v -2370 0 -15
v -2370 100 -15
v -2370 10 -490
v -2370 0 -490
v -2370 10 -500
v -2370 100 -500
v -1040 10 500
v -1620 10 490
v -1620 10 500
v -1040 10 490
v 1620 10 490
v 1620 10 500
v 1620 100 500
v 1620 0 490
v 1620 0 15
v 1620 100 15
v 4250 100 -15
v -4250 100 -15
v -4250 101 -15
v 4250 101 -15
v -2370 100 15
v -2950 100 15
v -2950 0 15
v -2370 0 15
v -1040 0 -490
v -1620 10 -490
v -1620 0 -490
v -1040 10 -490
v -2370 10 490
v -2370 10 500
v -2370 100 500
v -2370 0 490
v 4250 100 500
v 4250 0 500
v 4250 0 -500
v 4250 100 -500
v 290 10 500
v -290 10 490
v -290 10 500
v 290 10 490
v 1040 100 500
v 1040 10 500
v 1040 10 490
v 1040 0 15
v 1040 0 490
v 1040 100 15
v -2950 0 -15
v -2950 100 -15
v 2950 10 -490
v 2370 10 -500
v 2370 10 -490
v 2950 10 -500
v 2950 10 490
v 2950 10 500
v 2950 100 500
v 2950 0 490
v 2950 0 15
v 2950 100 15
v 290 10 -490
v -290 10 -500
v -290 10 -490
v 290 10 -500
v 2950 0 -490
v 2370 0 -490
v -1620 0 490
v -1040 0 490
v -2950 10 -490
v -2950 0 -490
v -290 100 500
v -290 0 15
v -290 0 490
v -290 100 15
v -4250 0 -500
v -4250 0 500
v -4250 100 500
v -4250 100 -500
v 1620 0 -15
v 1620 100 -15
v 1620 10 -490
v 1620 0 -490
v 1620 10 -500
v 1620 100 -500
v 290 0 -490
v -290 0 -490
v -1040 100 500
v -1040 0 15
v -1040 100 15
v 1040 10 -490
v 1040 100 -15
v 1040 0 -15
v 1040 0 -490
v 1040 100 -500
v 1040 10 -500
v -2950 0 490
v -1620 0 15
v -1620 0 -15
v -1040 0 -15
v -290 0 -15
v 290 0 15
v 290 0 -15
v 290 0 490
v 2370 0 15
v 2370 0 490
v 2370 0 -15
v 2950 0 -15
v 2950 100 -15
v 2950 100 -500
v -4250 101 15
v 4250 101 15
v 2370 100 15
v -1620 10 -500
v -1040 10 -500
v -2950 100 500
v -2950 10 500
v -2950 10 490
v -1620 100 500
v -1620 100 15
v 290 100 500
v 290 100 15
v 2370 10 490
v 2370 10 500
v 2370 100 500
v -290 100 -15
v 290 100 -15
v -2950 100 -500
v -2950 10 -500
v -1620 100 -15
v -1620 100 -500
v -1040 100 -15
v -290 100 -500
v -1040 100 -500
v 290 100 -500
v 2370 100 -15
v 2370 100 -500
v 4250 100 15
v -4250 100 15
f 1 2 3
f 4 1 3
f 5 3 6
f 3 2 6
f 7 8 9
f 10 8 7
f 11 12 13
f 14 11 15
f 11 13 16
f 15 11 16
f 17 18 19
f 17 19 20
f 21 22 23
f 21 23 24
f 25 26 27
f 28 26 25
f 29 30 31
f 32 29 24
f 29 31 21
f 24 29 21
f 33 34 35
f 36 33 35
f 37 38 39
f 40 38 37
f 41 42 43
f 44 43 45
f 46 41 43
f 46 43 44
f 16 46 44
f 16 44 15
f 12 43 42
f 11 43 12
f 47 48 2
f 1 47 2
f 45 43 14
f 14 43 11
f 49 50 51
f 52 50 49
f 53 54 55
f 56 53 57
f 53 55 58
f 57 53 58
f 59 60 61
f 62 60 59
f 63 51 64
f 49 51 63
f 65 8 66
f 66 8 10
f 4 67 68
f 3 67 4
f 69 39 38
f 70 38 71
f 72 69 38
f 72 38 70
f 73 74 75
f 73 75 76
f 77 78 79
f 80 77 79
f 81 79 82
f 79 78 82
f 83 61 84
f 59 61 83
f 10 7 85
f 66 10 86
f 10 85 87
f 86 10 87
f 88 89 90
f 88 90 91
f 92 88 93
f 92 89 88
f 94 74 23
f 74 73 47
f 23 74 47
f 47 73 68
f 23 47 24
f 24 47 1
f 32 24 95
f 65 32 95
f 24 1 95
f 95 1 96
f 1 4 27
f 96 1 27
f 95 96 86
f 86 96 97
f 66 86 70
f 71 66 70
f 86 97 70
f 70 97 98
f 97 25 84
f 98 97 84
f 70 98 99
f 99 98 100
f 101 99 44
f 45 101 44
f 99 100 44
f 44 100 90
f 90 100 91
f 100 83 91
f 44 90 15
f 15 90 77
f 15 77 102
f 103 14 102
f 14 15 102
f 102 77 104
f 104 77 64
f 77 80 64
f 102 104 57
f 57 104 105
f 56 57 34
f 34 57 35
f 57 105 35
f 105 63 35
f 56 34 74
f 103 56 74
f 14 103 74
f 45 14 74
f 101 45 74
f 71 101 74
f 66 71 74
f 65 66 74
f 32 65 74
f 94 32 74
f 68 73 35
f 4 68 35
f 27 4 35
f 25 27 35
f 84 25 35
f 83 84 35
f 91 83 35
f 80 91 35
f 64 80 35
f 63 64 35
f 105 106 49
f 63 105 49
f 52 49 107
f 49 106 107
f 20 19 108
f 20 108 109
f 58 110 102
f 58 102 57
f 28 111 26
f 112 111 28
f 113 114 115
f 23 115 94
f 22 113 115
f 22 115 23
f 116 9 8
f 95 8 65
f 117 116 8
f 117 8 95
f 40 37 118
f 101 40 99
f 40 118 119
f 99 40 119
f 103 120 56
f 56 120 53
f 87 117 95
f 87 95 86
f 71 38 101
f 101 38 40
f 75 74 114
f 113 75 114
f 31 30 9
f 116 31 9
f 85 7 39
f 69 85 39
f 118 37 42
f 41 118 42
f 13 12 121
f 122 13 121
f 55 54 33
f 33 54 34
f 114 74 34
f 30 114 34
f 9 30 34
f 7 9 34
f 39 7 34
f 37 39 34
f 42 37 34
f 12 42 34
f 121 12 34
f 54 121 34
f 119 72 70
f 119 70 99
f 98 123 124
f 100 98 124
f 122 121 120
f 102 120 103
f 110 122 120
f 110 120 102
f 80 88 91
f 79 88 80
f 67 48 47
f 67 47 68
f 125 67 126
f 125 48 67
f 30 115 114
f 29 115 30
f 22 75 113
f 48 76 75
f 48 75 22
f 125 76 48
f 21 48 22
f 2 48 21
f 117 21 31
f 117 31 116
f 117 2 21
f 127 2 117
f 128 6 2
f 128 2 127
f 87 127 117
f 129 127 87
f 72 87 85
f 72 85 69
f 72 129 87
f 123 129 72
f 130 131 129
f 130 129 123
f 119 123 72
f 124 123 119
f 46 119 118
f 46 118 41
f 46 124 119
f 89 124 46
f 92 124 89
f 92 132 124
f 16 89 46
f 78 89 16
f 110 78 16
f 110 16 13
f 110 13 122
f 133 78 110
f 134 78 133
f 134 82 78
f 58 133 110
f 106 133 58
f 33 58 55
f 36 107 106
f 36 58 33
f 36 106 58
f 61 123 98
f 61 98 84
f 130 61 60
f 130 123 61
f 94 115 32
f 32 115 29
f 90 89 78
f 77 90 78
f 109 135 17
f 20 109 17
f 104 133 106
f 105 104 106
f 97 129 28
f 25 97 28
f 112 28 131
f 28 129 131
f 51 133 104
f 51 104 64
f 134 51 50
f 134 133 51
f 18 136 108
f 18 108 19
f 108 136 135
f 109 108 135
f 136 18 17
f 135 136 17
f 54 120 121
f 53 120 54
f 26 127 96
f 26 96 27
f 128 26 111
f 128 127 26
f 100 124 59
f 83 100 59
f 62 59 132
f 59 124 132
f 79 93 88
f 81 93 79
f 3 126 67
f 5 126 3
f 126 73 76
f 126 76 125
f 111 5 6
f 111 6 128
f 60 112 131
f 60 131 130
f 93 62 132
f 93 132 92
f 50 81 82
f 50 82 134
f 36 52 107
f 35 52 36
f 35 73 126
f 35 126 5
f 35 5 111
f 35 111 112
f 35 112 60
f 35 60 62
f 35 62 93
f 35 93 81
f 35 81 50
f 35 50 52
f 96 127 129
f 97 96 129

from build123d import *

# Parameters (mm, degrees)
SKETCH1_W           = 8500
SKETCH1_H           = 1000
BOSS_EXTRUDE1_DEPTH = 100
SKETCH2_W           = 8500
SKETCH2_H           = 30
BOSS_EXTRUDE2_DEPTH = 1
SKETCH3_W           = 580
SKETCH3_H           = 475
CUT_EXTRUDE2_DEPTH  = 4281.478945165
SKETCH4_W           = 580
SKETCH4_H           = 10
CUT_EXTRUDE3_DEPTH  = 90


with BuildPart() as part:
    # Sketch1 → Boss-Extrude1 (new body)
    with BuildSketch(Plane(origin=(0, 0, 0), x_dir=(1, 0, 0), z_dir=(0, 1, 0))):
        Rectangle(SKETCH1_W, SKETCH1_H)
    extrude(amount=BOSS_EXTRUDE1_DEPTH)

    # Sketch3 → Cut-Extrude2 (cut, through all)
    with BuildSketch(Plane(origin=(0, 100, 0), x_dir=(1, 0, 0), z_dir=(0, 1, 0))):
        with Locations((-2660, 252.5)):
            Rectangle(SKETCH3_W, SKETCH3_H)
        with Locations((-1330, 252.5)):
            Rectangle(SKETCH3_W, SKETCH3_H)
        with Locations((0, 252.5)):
            Rectangle(SKETCH3_W, SKETCH3_H)
        with Locations((1330, 252.5)):
            Rectangle(SKETCH3_W, SKETCH3_H)
        with Locations((2660, 252.5)):
            Rectangle(SKETCH3_W, SKETCH3_H)
        with Locations((-1330, -252.5)):
            Rectangle(SKETCH3_W, SKETCH3_H)
        with Locations((0, -252.5)):
            Rectangle(SKETCH3_W, SKETCH3_H)
        with Locations((1330, -252.5)):
            Rectangle(SKETCH3_W, SKETCH3_H)
        with Locations((2660, -252.5)):
            Rectangle(SKETCH3_W, SKETCH3_H)
        with Locations((-2660, -252.5)):
            Rectangle(SKETCH3_W, SKETCH3_H)
    extrude(amount=-CUT_EXTRUDE2_DEPTH, mode=Mode.SUBTRACT)

    # Sketch4 → Cut-Extrude3 (cut)
    with BuildSketch(Plane(origin=(0, 100, 0), x_dir=(1, 0, 0), z_dir=(0, 1, 0))):
        with Locations((-2660, 495)):
            Rectangle(SKETCH4_W, SKETCH4_H)
        with Locations((-1330, 495)):
            Rectangle(SKETCH4_W, SKETCH4_H)
        with Locations((0, 495)):
            Rectangle(SKETCH4_W, SKETCH4_H)
        with Locations((1330, 495)):
            Rectangle(SKETCH4_W, SKETCH4_H)
        with Locations((2660, 495)):
            Rectangle(SKETCH4_W, SKETCH4_H)
        with Locations((-1330, -495)):
            Rectangle(SKETCH4_W, SKETCH4_H)
        with Locations((0, -495)):
            Rectangle(SKETCH4_W, SKETCH4_H)
        with Locations((1330, -495)):
            Rectangle(SKETCH4_W, SKETCH4_H)
        with Locations((2660, -495)):
            Rectangle(SKETCH4_W, SKETCH4_H)
        with Locations((-2660, -495)):
            Rectangle(SKETCH4_W, SKETCH4_H)
    extrude(amount=-CUT_EXTRUDE3_DEPTH, mode=Mode.SUBTRACT)


with BuildPart() as body_2:
    # Sketch2 → Boss-Extrude2 (new body)
    with BuildSketch(Plane(origin=(0, 100, 0), x_dir=(1, 0, 0), z_dir=(0, 1, 0))):
        Rectangle(SKETCH2_W, SKETCH2_H)
    extrude(amount=BOSS_EXTRUDE2_DEPTH)


solid = Compound([part.part, body_2.part])
